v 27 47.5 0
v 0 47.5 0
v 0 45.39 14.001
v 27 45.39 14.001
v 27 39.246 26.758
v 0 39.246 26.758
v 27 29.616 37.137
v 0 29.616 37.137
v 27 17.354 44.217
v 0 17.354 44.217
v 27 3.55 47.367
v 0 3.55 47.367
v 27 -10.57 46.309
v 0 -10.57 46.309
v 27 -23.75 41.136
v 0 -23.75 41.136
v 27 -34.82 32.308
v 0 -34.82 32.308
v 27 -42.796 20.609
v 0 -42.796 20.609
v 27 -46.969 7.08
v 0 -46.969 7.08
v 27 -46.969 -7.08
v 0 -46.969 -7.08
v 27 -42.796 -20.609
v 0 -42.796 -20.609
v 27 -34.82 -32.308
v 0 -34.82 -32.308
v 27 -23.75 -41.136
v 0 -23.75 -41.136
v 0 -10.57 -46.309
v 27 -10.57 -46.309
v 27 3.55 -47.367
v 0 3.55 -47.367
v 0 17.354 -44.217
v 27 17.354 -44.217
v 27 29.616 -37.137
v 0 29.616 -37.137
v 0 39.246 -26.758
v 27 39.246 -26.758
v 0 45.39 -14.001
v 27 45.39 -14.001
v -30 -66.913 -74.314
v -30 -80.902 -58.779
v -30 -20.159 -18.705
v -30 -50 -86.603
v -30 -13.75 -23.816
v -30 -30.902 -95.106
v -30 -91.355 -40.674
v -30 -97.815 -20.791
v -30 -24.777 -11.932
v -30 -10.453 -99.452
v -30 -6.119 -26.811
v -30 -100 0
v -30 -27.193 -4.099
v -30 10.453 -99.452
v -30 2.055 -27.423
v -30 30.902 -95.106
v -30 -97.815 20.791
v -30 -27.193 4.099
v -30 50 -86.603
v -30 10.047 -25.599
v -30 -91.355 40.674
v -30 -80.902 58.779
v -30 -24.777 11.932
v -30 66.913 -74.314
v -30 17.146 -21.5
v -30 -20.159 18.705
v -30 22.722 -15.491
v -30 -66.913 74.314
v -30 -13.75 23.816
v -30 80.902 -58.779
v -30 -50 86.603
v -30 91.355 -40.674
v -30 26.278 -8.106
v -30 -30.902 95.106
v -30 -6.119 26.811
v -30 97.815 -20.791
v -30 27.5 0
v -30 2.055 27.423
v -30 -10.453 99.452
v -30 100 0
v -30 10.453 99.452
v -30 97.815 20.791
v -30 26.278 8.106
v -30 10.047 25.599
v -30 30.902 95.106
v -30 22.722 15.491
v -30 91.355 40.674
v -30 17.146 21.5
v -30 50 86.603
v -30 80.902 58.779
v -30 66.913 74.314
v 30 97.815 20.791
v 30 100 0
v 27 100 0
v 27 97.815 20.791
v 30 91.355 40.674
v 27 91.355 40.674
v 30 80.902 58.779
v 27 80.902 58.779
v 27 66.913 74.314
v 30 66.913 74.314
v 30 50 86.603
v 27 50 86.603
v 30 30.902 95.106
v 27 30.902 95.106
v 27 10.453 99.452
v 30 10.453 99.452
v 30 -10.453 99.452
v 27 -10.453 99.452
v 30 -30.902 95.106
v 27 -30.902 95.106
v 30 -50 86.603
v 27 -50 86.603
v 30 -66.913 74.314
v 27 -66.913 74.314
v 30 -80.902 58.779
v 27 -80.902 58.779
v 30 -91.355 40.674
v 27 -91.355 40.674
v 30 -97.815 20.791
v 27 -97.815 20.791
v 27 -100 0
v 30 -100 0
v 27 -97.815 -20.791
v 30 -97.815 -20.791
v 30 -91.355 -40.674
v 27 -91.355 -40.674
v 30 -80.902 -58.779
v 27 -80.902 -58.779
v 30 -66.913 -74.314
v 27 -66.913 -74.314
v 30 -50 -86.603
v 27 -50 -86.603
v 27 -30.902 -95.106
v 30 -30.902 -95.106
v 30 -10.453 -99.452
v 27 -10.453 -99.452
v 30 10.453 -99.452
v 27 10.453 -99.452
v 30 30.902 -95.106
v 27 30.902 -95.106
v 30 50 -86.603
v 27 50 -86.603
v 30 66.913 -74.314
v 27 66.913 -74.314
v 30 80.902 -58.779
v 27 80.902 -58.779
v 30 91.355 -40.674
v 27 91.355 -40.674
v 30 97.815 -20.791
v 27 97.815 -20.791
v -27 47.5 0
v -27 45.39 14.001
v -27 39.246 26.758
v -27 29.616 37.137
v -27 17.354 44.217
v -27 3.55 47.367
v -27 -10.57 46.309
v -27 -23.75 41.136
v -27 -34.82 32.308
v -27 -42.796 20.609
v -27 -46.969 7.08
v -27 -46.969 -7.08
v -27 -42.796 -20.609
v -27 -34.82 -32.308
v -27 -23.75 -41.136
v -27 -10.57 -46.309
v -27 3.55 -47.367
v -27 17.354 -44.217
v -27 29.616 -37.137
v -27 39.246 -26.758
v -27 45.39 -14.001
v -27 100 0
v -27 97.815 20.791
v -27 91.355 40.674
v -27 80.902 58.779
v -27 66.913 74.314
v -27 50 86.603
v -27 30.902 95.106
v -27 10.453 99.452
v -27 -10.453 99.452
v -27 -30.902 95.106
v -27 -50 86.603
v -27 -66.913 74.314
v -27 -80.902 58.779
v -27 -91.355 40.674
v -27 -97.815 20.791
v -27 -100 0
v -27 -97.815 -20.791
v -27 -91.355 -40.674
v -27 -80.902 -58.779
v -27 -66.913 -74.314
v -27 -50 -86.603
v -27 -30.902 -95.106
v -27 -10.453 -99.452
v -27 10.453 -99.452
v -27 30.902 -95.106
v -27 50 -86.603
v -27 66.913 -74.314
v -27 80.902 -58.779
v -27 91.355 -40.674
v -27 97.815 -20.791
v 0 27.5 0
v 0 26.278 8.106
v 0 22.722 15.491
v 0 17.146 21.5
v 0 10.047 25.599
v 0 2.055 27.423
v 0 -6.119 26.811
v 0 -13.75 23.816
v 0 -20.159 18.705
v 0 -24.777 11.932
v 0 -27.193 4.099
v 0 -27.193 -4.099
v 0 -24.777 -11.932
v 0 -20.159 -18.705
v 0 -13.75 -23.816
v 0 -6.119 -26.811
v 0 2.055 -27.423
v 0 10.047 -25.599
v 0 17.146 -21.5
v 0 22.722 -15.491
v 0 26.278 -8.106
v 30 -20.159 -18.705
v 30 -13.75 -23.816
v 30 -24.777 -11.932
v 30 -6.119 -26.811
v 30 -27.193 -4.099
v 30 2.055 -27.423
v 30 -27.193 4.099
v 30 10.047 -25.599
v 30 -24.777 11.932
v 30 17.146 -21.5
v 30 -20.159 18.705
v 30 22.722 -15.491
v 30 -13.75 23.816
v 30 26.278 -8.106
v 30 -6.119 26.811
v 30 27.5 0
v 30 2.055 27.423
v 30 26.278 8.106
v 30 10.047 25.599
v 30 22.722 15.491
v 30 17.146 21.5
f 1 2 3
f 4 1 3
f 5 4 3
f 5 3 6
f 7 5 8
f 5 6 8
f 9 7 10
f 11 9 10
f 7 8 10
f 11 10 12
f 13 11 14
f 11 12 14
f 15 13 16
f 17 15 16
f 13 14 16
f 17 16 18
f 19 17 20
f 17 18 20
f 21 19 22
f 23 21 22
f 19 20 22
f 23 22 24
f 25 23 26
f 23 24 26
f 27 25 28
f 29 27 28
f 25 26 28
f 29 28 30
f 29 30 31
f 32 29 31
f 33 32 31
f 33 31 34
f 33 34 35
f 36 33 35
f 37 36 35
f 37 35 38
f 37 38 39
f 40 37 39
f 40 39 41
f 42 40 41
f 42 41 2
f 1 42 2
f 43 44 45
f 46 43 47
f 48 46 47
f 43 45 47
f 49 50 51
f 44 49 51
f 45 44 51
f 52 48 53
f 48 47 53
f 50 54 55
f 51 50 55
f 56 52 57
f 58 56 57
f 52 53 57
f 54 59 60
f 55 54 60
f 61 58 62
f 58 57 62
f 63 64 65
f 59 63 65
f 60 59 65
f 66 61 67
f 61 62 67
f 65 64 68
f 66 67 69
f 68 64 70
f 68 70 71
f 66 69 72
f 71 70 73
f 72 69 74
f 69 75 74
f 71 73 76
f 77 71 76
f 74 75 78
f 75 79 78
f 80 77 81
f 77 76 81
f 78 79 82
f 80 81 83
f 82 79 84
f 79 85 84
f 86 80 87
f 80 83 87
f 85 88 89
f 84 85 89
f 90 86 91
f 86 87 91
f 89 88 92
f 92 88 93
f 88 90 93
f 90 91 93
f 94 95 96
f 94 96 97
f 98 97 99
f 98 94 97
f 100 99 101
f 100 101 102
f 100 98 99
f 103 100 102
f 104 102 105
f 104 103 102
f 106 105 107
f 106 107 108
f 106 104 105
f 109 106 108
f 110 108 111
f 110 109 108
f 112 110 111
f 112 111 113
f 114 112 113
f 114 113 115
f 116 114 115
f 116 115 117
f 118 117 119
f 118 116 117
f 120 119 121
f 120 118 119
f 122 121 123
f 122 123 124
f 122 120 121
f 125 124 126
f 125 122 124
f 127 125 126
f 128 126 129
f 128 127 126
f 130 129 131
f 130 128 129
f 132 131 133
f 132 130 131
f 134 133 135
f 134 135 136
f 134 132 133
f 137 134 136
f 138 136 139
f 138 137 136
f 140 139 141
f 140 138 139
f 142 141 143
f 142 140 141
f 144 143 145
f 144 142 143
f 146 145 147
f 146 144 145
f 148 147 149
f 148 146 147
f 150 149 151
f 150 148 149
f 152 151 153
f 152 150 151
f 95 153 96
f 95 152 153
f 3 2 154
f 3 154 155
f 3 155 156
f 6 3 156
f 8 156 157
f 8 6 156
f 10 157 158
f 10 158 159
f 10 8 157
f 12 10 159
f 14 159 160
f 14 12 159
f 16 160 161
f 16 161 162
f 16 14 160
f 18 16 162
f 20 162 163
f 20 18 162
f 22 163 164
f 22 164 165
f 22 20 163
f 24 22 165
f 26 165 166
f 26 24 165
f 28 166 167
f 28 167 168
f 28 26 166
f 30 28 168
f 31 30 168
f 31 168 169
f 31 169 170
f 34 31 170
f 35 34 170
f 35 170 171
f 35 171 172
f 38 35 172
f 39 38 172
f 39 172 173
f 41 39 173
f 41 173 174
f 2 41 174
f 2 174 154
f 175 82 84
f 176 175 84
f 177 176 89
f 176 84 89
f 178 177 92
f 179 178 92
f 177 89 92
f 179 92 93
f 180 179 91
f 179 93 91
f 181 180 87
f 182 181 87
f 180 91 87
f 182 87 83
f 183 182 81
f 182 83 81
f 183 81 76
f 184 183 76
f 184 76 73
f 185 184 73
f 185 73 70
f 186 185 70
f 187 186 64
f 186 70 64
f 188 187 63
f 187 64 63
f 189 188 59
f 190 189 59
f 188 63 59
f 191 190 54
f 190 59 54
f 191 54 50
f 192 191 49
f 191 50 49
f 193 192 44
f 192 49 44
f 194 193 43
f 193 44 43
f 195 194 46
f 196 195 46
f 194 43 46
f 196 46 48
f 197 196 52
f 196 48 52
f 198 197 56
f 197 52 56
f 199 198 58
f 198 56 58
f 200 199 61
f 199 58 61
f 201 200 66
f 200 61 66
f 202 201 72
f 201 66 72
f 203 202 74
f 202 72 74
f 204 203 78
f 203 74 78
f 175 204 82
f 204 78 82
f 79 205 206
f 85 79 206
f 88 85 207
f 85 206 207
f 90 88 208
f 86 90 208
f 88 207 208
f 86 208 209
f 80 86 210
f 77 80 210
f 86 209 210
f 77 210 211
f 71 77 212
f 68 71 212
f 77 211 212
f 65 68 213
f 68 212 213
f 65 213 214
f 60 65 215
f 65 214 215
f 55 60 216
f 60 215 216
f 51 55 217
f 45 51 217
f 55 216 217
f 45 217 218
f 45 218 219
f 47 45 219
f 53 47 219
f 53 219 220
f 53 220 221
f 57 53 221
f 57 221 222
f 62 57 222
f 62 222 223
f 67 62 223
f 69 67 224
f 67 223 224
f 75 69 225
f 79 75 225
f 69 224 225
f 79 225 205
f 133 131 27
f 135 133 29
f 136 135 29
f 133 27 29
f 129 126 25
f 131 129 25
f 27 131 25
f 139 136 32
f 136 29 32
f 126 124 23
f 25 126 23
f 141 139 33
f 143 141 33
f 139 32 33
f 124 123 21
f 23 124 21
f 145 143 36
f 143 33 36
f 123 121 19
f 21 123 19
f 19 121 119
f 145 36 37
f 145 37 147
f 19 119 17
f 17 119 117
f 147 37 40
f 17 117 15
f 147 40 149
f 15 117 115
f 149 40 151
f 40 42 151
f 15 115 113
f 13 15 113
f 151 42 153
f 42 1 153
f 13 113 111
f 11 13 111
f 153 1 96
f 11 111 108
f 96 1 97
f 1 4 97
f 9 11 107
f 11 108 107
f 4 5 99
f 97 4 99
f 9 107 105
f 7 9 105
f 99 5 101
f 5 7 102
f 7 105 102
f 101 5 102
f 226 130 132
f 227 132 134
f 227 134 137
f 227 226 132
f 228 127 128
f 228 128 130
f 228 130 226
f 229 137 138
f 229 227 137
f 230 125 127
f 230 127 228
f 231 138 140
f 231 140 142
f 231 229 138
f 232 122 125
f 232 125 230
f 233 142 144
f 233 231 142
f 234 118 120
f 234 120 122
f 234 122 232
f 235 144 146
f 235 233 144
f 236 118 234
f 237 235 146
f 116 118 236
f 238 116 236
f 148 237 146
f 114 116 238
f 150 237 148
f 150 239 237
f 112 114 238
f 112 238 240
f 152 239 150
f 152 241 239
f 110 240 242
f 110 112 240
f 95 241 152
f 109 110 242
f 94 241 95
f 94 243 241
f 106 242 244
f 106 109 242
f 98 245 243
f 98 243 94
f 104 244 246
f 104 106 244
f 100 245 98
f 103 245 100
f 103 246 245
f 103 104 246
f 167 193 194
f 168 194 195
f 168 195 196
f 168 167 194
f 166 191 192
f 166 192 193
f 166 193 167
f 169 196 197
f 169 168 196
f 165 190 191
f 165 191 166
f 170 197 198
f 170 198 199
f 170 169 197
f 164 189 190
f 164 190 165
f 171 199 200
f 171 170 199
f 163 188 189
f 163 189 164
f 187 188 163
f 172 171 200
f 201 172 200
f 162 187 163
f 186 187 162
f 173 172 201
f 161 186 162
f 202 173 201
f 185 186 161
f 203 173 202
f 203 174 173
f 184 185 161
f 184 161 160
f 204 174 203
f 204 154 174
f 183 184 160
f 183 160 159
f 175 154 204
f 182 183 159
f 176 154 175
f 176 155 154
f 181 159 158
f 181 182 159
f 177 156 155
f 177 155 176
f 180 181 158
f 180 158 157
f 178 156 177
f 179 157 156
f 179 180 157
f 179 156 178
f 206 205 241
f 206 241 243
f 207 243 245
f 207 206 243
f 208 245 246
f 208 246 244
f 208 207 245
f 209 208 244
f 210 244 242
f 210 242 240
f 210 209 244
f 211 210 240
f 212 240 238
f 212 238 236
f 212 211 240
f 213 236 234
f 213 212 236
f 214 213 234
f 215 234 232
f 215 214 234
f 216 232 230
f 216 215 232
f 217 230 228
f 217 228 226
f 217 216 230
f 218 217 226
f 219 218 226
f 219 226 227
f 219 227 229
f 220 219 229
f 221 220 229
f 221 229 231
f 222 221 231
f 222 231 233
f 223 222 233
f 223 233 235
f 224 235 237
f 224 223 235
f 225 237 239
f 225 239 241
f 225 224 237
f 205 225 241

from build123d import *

# Parameters (mm, degrees)
F0_R     = 47.5
F0_R_2   = 27.5
F1_DEPTH = 30
F2_R     = 100
F2_R_2   = 47.5
F3_DEPTH = 3


with BuildPart() as f1:
    # F0 (on Right) → F1 (new body)
    with BuildSketch(Plane.YZ):
        Circle(F0_R)
        Circle(F0_R_2, mode=Mode.SUBTRACT)
    extrude(amount=F1_DEPTH)

    # F2 (on face) → F3 (join)
    with BuildSketch(Plane.YZ.offset(30)):
        Circle(F2_R)
        Circle(F2_R_2, mode=Mode.SUBTRACT)
    extrude(amount=-F3_DEPTH)

    # F4: F1 across face


with BuildPart() as f1_1:
    add(f1.part)
    add(f1.part.mirror(Plane(origin=(0, 0, 0), x_dir=(0, 1, 0), z_dir=(-1, 0, 0))))


solid = f1_1.part
